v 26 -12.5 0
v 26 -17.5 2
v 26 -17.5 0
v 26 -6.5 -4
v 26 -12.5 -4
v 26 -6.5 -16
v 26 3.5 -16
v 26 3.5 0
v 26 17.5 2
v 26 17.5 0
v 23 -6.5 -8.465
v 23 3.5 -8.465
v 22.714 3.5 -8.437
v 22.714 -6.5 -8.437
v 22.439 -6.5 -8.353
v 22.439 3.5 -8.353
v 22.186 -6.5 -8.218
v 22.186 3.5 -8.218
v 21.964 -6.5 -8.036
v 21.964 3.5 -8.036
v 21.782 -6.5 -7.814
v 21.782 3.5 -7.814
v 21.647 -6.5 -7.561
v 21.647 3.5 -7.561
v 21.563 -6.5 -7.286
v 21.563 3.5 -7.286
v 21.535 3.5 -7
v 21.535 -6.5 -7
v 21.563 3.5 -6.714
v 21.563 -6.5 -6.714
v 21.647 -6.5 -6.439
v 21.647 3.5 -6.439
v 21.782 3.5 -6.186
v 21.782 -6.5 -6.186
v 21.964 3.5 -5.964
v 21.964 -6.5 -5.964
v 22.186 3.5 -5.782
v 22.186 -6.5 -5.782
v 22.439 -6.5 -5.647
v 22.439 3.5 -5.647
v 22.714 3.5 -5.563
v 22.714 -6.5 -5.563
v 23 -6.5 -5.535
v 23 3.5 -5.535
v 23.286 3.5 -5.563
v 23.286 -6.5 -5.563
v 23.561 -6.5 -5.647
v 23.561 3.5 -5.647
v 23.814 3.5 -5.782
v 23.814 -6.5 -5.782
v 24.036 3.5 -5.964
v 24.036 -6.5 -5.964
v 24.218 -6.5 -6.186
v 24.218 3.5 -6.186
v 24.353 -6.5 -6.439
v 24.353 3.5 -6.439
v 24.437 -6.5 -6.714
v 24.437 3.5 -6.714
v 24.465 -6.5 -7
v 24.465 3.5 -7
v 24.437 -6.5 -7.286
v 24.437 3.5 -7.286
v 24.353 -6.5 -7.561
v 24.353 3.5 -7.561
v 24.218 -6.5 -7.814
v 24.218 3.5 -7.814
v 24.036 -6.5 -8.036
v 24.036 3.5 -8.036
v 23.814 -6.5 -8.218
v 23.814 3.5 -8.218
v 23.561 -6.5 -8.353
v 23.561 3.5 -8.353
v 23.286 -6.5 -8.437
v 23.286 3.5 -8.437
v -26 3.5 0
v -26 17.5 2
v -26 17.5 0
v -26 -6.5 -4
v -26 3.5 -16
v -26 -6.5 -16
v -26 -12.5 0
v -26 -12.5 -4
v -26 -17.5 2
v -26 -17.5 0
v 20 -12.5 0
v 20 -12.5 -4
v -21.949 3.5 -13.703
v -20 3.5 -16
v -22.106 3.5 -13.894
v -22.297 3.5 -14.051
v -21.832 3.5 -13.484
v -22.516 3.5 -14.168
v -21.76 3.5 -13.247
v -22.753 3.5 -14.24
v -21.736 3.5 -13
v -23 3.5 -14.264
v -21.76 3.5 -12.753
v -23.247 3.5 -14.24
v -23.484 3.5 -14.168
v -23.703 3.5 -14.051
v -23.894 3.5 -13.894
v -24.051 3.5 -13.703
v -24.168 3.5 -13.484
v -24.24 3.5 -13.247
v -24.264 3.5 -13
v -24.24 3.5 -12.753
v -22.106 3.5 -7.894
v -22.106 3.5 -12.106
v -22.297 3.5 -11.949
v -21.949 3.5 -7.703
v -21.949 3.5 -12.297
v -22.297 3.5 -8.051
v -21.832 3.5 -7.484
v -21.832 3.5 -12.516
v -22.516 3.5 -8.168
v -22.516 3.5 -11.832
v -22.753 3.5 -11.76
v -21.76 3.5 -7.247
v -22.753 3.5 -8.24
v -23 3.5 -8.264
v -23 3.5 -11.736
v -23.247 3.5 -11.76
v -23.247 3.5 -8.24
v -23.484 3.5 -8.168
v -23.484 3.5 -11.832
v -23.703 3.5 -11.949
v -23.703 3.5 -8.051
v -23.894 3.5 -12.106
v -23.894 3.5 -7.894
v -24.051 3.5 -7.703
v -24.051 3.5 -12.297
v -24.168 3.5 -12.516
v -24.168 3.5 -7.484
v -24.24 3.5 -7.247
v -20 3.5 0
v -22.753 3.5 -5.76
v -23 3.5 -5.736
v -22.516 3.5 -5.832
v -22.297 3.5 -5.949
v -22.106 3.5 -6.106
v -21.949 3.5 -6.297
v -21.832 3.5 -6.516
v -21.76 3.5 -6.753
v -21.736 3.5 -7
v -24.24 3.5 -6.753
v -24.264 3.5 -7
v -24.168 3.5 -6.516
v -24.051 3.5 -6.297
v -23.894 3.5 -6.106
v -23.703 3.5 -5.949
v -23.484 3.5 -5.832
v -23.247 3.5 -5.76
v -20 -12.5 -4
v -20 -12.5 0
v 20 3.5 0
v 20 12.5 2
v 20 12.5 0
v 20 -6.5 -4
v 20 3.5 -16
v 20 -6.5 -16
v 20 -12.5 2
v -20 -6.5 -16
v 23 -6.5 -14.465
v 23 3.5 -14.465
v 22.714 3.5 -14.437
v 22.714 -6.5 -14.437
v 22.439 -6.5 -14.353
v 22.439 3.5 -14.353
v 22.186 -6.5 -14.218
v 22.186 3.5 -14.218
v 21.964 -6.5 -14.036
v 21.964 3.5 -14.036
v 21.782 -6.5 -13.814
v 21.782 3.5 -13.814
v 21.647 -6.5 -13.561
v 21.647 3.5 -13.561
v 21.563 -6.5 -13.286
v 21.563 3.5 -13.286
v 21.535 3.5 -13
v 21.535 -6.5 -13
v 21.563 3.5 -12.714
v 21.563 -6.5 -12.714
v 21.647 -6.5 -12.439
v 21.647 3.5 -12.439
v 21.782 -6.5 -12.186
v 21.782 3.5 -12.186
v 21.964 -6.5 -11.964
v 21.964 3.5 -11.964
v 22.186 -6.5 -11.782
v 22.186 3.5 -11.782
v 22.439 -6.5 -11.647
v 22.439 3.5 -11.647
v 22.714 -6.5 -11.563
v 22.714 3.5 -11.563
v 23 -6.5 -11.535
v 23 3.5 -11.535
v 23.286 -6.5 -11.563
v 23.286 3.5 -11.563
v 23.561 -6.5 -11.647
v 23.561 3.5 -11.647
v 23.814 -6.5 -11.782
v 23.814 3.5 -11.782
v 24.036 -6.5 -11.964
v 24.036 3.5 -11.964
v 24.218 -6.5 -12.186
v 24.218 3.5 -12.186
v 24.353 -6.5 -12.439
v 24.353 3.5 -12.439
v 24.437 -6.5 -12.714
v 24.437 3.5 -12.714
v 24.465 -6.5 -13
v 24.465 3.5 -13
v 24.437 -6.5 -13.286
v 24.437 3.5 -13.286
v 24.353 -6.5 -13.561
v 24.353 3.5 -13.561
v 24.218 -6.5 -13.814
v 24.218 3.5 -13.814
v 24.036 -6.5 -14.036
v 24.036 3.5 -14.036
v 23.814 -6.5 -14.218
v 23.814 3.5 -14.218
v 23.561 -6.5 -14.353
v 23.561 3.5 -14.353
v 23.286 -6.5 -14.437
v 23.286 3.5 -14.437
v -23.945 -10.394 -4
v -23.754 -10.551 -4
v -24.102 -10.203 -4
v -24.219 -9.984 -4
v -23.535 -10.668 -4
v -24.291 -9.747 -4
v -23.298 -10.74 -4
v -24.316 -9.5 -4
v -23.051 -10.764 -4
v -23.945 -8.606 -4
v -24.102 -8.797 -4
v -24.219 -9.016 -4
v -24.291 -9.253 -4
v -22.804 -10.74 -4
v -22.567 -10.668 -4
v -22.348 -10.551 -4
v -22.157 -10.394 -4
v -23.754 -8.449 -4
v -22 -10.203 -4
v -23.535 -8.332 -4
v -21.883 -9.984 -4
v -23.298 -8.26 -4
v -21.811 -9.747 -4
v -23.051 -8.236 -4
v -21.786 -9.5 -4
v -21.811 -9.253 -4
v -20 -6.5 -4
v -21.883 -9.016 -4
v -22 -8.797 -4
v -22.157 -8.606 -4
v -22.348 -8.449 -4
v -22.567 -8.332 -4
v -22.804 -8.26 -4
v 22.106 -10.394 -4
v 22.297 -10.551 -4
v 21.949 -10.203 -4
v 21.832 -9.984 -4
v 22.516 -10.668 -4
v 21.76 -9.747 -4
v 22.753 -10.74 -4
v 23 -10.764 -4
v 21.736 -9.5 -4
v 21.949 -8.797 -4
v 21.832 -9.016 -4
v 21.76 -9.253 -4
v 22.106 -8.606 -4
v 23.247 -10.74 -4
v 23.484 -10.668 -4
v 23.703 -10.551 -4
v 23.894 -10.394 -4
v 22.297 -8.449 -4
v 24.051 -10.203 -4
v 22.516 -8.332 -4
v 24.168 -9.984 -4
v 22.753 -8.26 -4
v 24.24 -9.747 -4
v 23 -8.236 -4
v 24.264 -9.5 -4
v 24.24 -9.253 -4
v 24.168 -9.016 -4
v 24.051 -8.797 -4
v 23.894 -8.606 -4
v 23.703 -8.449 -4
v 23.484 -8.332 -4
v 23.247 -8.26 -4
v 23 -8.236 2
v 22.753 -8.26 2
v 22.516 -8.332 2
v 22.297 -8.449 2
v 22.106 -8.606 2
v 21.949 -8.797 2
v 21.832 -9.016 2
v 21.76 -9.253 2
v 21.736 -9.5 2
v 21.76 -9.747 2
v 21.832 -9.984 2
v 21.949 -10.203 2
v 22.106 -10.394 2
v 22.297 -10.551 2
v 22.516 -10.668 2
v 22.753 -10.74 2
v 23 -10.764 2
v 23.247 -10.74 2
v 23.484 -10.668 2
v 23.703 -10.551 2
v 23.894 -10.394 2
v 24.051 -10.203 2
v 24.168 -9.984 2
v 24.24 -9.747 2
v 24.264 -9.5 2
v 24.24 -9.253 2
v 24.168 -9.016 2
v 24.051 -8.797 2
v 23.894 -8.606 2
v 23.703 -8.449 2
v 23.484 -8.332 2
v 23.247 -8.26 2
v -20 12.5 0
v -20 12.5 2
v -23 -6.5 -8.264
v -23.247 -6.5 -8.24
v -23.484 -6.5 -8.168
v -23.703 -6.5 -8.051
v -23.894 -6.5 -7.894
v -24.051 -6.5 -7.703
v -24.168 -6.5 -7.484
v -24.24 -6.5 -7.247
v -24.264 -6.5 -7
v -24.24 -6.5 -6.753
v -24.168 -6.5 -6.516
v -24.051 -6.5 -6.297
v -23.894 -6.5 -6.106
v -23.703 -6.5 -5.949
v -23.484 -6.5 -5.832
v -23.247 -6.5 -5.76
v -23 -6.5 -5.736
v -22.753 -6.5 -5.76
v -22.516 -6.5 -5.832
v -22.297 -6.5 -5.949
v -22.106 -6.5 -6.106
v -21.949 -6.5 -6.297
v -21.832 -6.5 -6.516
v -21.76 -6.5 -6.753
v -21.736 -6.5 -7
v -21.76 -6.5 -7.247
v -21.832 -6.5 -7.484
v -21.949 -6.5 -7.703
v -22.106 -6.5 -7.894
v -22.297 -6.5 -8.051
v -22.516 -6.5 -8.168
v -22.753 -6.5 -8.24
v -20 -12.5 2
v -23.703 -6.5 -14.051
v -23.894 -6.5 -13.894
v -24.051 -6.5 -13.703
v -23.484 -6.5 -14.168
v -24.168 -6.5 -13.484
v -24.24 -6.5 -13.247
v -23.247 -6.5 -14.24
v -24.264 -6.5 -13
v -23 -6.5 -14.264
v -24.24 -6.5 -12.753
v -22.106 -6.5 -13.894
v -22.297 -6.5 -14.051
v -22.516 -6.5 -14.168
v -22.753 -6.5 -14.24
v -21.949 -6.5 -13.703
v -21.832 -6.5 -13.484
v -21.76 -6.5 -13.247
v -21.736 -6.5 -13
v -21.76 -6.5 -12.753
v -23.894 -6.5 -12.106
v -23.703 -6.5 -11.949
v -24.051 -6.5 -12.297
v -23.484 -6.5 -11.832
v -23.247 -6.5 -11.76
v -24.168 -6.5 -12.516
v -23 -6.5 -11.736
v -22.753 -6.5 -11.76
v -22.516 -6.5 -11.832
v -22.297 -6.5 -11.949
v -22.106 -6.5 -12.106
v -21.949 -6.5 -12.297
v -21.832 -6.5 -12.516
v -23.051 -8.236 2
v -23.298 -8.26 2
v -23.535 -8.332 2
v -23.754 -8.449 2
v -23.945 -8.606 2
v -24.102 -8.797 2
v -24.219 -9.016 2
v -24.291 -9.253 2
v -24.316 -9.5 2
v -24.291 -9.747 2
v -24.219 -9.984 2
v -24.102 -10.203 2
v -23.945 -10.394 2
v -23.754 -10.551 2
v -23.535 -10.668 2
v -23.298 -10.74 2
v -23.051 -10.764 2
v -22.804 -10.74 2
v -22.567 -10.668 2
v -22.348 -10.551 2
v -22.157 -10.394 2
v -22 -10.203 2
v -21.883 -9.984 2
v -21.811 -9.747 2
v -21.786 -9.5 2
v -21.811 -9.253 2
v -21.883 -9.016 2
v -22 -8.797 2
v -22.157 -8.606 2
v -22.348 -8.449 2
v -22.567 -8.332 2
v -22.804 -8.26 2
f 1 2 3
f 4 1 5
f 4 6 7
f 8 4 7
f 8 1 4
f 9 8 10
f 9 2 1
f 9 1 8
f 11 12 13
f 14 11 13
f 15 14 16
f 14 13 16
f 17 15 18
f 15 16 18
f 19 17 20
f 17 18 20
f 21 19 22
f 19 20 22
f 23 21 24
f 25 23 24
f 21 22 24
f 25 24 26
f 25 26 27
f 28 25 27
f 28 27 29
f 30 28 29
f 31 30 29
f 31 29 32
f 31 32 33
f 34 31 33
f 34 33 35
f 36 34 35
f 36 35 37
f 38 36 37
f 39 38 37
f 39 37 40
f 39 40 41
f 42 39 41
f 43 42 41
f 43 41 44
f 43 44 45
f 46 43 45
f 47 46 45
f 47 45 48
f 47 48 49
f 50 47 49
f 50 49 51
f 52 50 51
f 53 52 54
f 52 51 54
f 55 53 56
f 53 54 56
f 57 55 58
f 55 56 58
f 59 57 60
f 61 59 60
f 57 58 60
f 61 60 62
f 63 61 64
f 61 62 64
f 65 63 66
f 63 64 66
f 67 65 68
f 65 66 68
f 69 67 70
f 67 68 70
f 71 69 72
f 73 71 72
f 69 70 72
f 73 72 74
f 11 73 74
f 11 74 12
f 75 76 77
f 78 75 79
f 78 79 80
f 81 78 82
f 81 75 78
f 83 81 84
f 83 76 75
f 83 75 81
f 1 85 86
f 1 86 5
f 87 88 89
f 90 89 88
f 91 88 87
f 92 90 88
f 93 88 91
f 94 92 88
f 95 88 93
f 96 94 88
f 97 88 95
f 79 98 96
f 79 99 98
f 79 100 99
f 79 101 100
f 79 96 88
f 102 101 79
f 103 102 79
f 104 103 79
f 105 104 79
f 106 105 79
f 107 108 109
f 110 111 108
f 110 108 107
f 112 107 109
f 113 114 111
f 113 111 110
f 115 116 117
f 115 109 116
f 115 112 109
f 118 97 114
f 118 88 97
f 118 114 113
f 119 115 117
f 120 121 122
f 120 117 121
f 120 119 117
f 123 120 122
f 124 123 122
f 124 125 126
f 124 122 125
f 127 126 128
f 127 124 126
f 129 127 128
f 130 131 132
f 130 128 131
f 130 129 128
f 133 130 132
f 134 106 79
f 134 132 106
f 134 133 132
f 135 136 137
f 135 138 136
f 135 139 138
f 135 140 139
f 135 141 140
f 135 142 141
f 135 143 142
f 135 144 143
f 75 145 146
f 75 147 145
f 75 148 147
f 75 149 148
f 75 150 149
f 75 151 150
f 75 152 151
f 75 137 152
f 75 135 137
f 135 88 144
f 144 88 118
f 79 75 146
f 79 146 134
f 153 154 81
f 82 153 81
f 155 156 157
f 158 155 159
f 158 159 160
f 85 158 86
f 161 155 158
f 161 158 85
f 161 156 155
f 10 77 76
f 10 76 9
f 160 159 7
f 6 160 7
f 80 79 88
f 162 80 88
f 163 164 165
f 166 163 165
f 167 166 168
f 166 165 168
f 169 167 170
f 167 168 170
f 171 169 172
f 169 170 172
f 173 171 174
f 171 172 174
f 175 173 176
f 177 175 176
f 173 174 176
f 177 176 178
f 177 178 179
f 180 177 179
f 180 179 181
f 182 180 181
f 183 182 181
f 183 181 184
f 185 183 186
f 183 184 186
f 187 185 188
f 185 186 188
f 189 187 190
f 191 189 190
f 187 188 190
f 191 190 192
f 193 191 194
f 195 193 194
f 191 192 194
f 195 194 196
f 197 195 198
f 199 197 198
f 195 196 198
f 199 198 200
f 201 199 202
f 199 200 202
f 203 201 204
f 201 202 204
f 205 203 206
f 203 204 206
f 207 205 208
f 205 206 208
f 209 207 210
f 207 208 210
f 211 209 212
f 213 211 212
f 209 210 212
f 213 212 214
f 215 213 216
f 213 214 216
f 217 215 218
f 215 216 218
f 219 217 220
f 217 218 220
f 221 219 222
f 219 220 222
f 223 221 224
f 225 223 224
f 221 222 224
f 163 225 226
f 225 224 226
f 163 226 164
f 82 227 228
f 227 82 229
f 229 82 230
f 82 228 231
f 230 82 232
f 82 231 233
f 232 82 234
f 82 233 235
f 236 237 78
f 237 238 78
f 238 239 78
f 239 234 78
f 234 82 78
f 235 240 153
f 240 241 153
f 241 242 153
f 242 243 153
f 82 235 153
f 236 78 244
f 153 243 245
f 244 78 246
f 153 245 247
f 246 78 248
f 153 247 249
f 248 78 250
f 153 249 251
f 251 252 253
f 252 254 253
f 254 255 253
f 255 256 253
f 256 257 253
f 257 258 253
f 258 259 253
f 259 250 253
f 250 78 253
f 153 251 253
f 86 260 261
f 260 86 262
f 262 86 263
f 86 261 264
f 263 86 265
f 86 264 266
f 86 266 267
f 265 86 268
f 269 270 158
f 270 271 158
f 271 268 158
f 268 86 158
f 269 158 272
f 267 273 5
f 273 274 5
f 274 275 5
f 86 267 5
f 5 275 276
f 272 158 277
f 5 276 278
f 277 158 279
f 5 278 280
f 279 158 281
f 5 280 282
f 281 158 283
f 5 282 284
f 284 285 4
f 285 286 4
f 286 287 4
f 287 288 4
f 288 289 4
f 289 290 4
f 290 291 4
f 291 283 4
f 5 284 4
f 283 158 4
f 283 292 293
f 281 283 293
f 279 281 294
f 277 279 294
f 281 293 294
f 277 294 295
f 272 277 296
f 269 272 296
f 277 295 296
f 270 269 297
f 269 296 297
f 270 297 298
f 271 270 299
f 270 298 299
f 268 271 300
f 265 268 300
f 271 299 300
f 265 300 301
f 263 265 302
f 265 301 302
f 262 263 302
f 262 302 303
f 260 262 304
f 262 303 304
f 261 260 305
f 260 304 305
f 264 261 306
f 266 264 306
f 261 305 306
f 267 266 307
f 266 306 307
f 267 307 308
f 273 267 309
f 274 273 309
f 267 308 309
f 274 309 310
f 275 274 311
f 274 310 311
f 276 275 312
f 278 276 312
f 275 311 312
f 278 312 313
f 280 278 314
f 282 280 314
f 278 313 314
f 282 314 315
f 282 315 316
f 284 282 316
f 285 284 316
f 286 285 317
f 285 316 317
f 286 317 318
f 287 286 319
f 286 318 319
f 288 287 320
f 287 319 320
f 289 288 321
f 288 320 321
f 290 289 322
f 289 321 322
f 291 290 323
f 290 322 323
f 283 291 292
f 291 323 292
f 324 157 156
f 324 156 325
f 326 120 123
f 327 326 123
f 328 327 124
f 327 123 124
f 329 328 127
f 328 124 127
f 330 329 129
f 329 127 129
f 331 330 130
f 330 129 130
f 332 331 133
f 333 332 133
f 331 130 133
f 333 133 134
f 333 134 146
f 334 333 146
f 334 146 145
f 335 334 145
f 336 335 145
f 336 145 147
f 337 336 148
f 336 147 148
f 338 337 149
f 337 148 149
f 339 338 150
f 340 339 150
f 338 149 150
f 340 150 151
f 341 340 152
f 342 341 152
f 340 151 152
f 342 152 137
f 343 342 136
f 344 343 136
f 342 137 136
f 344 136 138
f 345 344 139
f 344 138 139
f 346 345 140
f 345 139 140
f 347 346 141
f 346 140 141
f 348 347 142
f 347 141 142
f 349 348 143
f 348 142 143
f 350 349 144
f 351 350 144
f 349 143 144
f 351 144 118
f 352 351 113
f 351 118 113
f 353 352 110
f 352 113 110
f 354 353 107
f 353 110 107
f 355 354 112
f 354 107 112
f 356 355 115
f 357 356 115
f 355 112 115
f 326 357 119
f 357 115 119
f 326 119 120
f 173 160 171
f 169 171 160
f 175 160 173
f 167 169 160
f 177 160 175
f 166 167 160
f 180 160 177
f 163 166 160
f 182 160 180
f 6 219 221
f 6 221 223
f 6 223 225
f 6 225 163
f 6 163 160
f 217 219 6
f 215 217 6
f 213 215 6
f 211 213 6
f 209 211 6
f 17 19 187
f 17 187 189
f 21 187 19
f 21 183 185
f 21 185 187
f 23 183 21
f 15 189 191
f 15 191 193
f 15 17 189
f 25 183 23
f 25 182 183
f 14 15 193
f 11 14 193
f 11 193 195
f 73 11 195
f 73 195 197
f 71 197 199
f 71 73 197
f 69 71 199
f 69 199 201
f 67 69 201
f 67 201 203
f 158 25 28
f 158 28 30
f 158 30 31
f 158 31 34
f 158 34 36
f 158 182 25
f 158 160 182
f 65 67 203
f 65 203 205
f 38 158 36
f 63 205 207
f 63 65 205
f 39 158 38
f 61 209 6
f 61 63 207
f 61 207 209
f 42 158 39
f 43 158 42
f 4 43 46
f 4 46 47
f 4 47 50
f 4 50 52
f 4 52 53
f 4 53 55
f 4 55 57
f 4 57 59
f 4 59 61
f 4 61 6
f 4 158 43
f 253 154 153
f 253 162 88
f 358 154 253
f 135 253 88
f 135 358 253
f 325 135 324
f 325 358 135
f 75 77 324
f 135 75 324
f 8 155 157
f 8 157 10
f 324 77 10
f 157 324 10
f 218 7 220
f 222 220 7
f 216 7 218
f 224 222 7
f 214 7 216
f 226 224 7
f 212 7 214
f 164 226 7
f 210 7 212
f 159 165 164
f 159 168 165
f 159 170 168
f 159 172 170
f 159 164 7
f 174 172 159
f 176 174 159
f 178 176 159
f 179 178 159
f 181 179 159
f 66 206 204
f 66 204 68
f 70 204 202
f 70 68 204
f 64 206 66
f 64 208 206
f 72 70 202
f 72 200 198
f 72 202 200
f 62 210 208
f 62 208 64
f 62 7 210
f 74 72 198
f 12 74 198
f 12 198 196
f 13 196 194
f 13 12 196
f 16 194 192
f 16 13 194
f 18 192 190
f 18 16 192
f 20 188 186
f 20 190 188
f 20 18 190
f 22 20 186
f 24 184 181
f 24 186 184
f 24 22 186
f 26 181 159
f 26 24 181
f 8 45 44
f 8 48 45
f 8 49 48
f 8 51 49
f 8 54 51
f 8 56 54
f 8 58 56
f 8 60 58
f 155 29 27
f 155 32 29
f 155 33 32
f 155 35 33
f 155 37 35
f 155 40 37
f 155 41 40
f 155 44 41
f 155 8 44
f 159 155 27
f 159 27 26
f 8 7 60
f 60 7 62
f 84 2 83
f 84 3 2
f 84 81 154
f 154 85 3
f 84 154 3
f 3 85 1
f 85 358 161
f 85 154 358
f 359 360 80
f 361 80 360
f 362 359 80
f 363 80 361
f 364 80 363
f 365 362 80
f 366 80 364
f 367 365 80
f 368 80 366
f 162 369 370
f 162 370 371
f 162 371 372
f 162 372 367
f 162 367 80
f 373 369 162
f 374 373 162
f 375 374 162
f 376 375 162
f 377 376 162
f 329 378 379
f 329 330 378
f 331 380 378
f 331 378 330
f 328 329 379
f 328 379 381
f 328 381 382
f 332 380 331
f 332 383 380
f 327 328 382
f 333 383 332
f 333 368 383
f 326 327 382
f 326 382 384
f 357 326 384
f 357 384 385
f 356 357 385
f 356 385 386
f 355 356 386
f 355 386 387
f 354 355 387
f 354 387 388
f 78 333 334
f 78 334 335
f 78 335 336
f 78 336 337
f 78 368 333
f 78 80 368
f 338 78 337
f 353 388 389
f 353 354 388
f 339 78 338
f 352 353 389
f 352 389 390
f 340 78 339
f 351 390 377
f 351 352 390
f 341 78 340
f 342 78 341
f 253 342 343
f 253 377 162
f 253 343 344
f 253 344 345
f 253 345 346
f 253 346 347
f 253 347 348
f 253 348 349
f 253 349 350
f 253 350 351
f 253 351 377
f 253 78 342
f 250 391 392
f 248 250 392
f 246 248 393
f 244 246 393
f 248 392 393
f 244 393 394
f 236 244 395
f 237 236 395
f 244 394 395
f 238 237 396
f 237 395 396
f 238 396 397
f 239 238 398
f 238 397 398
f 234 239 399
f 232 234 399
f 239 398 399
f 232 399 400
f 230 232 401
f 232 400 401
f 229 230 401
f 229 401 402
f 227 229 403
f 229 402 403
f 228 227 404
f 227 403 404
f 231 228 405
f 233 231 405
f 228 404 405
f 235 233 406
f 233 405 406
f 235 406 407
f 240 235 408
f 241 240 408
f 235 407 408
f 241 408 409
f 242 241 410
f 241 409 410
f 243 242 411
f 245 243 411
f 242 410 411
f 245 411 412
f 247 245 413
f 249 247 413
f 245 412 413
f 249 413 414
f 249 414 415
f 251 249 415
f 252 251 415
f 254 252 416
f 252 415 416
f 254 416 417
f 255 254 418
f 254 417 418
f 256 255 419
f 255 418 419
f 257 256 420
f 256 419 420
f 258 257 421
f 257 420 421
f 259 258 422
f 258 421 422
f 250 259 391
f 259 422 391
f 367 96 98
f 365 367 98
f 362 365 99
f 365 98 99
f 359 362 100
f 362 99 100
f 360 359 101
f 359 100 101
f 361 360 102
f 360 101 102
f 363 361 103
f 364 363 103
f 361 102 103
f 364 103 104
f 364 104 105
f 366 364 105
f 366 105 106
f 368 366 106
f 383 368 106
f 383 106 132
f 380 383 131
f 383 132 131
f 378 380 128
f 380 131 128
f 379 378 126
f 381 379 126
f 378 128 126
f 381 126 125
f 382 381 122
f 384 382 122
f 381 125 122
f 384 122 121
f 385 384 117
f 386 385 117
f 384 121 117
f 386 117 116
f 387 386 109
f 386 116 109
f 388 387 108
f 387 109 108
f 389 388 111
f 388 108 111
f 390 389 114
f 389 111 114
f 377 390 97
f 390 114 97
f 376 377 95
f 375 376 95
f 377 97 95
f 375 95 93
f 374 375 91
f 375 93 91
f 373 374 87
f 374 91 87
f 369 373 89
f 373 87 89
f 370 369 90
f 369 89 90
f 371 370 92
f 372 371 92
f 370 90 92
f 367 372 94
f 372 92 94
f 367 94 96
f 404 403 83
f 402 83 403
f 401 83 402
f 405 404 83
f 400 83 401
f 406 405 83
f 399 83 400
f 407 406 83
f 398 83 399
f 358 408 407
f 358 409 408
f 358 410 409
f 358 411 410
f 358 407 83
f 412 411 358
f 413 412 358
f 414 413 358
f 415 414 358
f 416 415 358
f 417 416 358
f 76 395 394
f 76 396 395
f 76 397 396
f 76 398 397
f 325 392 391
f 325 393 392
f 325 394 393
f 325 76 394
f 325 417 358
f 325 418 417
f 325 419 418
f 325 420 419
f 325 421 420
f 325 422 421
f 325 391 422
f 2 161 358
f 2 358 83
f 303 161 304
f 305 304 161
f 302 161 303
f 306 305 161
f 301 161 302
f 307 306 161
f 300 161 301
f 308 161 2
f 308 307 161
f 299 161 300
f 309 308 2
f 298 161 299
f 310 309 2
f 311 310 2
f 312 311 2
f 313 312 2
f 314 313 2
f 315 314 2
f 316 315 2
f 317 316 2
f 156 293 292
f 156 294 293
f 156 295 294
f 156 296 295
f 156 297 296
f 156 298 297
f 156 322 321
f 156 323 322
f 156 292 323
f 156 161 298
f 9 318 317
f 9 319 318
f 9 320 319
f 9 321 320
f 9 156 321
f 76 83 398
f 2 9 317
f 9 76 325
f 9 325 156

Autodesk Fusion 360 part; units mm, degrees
sketch "Sketch1" plane through (0, 0, 0) normal (0, 0, 1) x (1, 0, 0)
  line L0 (26, -17.5) -> (-26, -17.5)
  line L1 (-26, -17.5) -> (-26, 17.5)
  line L2 (-26, 17.5) -> (26, 17.5)
  line L3 (26, 17.5) -> (26, -17.5)
  line L4 (26, -17.5) -> (-26, 17.5) construction
  line L5 (-26, -17.5) -> (26, 17.5) construction
  line L6 (-20, -12.5) -> (20, -12.5)
  line L7 (20, -12.5) -> (20, 12.5)
  line L8 (20, 12.5) -> (-20, 12.5)
  line L9 (-20, 12.5) -> (-20, -12.5)
  line L10 (-20, -12.5) -> (20, 12.5) construction
  line L11 (20, -12.5) -> (-20, 12.5) construction
  dimension "d1" = 52
  dimension "d2" = 35
  dimension "d3" = 40
  dimension "d4" = 25
extrude "Extrude1" add sketch "Sketch1" along normal blind 2
sketch "Sketch2" plane through (0, 0, 0) normal (0, 0, 1) x (1, 0, 0)
sketch "Sketch3" plane through (0, 0, 0) normal (0, 0, 1) x (1, 0, 0)
  line L0 (-20, -12.5) -> (-26, -12.5)
  line L1 (-26, -12.5) -> (-26, -6.5)
  line L2 (-26, -6.5) -> (-20, -6.5)
  line L3 (-20, -6.5) -> (-20, -12.5)
  dimension "d7" = 6
extrude "Extrude2" add sketch "Sketch3" against normal blind 4
sketch "Sketch4" plane through (0, 0, 0) normal (0, 0, 1) x (1, 0, 0)
  line L0 (20, -12.5) -> (26, -12.5)
  line L1 (26, -12.5) -> (26, -6.5)
  line L2 (26, -6.5) -> (20, -6.5)
  line L3 (20, -6.5) -> (20, -12.5)
  dimension "d10" = 6
  dimension "d11" = 6
extrude "Extrude3" add sketch "Sketch4" against normal blind 4
sketch "Sketch5" plane through (0, 0, 0) normal (0, 0, 1) x (1, 0, 0)
  line L0 (20, -6.5) -> (26, -6.5)
  line L1 (26, -6.5) -> (26, 3.5)
  line L2 (26, 3.5) -> (20, 3.5)
  line L3 (20, 3.5) -> (20, -6.5)
  line L4 (-26, -6.5) -> (-20, -6.5)
  line L5 (-20, -6.5) -> (-20, 3.5)
  line L6 (-20, 3.5) -> (-26, 3.5)
  line L7 (-26, 3.5) -> (-26, -6.5)
  dimension "d14" = 6
  dimension "d15" = 10
  dimension "d16" = 6
  dimension "d17" = 10
extrude "Extrude4" add sketch "Sketch5" against normal blind 10 contours L0 L1 L2 L3
sketch "Sketch6" plane through (0, 0, 0) normal (0, 0, 1) x (1, 0, 0)
  line L0 (-26, -6.5) -> (-20, -6.5)
  line L1 (-20, -6.5) -> (-20, 3.5)
  line L2 (-20, 3.5) -> (-26, 3.5)
  line L3 (-26, 3.5) -> (-26, -6.5)
  dimension "d20" = 6
  dimension "d21" = 10
extrude "Extrude5" add sketch "Sketch6" against normal blind 10
extrude "Extrude6" add 1 faces at (22, 0.1667, -10) along direction (0, 0, -1) blind 6
extrude "Extrude7" add 1 faces at (-24, 0.1667, -10) along direction (0, 0, -1) blind 6
sketch "Sketch7" plane through (0, -6.5, 0) normal (0, -1, 0) x (1, 0, 0)
  line L0 (26, -4) -> (20, -4)
  line L1 (20, -4) -> (20, -16)
  line L2 (20, -16) -> (26, -16)
  line L3 (26, -16) -> (26, -4)
  point P0 (23, -13)
  point P1 (23, -7)
  point P2 (-23, -13)
  point P3 (-23, -7)
hole "Hole1" at (23, -6.5, -13) at (23, -6.5, -7) direction (0, 1, 0) diameter 2.93 depth 10 tip angle 118
sketch "Sketch8" plane through (0, -6.5, 0) normal (0, -1, 0) x (1, 0, 0)
  line L0 (-20, -4) -> (-26, -4)
  line L1 (-26, -4) -> (-26, -16)
  line L2 (-26, -16) -> (-20, -16)
  line L3 (-20, -16) -> (-20, -4)
  point P0 (-23, -13)
  point P1 (-23, -7)
hole "Hole2" at (-23, -6.5, -13) at (-23, -6.5, -7) direction (0, 1, 0) diameter 2.529 depth 10 tip angle 118
sketch "Sketch9" plane through (0, 0, -4) normal (0, 0, -1) x (1, 0, 0)
  line L0 (20, 12.5) -> (20, 6.5)
  line L1 (20, 6.5) -> (26, 6.5)
  line L2 (26, 6.5) -> (26, 12.5)
  line L3 (26, 12.5) -> (20, 12.5)
  point P0 (23, 9.5)
  point P1 (-23.051, 9.5)
hole "Hole3" at (-23.051, -9.5, -4) at (23, -9.5, -4) direction (0, 0, 1) diameter 2.529 depth 6 tip angle 118
